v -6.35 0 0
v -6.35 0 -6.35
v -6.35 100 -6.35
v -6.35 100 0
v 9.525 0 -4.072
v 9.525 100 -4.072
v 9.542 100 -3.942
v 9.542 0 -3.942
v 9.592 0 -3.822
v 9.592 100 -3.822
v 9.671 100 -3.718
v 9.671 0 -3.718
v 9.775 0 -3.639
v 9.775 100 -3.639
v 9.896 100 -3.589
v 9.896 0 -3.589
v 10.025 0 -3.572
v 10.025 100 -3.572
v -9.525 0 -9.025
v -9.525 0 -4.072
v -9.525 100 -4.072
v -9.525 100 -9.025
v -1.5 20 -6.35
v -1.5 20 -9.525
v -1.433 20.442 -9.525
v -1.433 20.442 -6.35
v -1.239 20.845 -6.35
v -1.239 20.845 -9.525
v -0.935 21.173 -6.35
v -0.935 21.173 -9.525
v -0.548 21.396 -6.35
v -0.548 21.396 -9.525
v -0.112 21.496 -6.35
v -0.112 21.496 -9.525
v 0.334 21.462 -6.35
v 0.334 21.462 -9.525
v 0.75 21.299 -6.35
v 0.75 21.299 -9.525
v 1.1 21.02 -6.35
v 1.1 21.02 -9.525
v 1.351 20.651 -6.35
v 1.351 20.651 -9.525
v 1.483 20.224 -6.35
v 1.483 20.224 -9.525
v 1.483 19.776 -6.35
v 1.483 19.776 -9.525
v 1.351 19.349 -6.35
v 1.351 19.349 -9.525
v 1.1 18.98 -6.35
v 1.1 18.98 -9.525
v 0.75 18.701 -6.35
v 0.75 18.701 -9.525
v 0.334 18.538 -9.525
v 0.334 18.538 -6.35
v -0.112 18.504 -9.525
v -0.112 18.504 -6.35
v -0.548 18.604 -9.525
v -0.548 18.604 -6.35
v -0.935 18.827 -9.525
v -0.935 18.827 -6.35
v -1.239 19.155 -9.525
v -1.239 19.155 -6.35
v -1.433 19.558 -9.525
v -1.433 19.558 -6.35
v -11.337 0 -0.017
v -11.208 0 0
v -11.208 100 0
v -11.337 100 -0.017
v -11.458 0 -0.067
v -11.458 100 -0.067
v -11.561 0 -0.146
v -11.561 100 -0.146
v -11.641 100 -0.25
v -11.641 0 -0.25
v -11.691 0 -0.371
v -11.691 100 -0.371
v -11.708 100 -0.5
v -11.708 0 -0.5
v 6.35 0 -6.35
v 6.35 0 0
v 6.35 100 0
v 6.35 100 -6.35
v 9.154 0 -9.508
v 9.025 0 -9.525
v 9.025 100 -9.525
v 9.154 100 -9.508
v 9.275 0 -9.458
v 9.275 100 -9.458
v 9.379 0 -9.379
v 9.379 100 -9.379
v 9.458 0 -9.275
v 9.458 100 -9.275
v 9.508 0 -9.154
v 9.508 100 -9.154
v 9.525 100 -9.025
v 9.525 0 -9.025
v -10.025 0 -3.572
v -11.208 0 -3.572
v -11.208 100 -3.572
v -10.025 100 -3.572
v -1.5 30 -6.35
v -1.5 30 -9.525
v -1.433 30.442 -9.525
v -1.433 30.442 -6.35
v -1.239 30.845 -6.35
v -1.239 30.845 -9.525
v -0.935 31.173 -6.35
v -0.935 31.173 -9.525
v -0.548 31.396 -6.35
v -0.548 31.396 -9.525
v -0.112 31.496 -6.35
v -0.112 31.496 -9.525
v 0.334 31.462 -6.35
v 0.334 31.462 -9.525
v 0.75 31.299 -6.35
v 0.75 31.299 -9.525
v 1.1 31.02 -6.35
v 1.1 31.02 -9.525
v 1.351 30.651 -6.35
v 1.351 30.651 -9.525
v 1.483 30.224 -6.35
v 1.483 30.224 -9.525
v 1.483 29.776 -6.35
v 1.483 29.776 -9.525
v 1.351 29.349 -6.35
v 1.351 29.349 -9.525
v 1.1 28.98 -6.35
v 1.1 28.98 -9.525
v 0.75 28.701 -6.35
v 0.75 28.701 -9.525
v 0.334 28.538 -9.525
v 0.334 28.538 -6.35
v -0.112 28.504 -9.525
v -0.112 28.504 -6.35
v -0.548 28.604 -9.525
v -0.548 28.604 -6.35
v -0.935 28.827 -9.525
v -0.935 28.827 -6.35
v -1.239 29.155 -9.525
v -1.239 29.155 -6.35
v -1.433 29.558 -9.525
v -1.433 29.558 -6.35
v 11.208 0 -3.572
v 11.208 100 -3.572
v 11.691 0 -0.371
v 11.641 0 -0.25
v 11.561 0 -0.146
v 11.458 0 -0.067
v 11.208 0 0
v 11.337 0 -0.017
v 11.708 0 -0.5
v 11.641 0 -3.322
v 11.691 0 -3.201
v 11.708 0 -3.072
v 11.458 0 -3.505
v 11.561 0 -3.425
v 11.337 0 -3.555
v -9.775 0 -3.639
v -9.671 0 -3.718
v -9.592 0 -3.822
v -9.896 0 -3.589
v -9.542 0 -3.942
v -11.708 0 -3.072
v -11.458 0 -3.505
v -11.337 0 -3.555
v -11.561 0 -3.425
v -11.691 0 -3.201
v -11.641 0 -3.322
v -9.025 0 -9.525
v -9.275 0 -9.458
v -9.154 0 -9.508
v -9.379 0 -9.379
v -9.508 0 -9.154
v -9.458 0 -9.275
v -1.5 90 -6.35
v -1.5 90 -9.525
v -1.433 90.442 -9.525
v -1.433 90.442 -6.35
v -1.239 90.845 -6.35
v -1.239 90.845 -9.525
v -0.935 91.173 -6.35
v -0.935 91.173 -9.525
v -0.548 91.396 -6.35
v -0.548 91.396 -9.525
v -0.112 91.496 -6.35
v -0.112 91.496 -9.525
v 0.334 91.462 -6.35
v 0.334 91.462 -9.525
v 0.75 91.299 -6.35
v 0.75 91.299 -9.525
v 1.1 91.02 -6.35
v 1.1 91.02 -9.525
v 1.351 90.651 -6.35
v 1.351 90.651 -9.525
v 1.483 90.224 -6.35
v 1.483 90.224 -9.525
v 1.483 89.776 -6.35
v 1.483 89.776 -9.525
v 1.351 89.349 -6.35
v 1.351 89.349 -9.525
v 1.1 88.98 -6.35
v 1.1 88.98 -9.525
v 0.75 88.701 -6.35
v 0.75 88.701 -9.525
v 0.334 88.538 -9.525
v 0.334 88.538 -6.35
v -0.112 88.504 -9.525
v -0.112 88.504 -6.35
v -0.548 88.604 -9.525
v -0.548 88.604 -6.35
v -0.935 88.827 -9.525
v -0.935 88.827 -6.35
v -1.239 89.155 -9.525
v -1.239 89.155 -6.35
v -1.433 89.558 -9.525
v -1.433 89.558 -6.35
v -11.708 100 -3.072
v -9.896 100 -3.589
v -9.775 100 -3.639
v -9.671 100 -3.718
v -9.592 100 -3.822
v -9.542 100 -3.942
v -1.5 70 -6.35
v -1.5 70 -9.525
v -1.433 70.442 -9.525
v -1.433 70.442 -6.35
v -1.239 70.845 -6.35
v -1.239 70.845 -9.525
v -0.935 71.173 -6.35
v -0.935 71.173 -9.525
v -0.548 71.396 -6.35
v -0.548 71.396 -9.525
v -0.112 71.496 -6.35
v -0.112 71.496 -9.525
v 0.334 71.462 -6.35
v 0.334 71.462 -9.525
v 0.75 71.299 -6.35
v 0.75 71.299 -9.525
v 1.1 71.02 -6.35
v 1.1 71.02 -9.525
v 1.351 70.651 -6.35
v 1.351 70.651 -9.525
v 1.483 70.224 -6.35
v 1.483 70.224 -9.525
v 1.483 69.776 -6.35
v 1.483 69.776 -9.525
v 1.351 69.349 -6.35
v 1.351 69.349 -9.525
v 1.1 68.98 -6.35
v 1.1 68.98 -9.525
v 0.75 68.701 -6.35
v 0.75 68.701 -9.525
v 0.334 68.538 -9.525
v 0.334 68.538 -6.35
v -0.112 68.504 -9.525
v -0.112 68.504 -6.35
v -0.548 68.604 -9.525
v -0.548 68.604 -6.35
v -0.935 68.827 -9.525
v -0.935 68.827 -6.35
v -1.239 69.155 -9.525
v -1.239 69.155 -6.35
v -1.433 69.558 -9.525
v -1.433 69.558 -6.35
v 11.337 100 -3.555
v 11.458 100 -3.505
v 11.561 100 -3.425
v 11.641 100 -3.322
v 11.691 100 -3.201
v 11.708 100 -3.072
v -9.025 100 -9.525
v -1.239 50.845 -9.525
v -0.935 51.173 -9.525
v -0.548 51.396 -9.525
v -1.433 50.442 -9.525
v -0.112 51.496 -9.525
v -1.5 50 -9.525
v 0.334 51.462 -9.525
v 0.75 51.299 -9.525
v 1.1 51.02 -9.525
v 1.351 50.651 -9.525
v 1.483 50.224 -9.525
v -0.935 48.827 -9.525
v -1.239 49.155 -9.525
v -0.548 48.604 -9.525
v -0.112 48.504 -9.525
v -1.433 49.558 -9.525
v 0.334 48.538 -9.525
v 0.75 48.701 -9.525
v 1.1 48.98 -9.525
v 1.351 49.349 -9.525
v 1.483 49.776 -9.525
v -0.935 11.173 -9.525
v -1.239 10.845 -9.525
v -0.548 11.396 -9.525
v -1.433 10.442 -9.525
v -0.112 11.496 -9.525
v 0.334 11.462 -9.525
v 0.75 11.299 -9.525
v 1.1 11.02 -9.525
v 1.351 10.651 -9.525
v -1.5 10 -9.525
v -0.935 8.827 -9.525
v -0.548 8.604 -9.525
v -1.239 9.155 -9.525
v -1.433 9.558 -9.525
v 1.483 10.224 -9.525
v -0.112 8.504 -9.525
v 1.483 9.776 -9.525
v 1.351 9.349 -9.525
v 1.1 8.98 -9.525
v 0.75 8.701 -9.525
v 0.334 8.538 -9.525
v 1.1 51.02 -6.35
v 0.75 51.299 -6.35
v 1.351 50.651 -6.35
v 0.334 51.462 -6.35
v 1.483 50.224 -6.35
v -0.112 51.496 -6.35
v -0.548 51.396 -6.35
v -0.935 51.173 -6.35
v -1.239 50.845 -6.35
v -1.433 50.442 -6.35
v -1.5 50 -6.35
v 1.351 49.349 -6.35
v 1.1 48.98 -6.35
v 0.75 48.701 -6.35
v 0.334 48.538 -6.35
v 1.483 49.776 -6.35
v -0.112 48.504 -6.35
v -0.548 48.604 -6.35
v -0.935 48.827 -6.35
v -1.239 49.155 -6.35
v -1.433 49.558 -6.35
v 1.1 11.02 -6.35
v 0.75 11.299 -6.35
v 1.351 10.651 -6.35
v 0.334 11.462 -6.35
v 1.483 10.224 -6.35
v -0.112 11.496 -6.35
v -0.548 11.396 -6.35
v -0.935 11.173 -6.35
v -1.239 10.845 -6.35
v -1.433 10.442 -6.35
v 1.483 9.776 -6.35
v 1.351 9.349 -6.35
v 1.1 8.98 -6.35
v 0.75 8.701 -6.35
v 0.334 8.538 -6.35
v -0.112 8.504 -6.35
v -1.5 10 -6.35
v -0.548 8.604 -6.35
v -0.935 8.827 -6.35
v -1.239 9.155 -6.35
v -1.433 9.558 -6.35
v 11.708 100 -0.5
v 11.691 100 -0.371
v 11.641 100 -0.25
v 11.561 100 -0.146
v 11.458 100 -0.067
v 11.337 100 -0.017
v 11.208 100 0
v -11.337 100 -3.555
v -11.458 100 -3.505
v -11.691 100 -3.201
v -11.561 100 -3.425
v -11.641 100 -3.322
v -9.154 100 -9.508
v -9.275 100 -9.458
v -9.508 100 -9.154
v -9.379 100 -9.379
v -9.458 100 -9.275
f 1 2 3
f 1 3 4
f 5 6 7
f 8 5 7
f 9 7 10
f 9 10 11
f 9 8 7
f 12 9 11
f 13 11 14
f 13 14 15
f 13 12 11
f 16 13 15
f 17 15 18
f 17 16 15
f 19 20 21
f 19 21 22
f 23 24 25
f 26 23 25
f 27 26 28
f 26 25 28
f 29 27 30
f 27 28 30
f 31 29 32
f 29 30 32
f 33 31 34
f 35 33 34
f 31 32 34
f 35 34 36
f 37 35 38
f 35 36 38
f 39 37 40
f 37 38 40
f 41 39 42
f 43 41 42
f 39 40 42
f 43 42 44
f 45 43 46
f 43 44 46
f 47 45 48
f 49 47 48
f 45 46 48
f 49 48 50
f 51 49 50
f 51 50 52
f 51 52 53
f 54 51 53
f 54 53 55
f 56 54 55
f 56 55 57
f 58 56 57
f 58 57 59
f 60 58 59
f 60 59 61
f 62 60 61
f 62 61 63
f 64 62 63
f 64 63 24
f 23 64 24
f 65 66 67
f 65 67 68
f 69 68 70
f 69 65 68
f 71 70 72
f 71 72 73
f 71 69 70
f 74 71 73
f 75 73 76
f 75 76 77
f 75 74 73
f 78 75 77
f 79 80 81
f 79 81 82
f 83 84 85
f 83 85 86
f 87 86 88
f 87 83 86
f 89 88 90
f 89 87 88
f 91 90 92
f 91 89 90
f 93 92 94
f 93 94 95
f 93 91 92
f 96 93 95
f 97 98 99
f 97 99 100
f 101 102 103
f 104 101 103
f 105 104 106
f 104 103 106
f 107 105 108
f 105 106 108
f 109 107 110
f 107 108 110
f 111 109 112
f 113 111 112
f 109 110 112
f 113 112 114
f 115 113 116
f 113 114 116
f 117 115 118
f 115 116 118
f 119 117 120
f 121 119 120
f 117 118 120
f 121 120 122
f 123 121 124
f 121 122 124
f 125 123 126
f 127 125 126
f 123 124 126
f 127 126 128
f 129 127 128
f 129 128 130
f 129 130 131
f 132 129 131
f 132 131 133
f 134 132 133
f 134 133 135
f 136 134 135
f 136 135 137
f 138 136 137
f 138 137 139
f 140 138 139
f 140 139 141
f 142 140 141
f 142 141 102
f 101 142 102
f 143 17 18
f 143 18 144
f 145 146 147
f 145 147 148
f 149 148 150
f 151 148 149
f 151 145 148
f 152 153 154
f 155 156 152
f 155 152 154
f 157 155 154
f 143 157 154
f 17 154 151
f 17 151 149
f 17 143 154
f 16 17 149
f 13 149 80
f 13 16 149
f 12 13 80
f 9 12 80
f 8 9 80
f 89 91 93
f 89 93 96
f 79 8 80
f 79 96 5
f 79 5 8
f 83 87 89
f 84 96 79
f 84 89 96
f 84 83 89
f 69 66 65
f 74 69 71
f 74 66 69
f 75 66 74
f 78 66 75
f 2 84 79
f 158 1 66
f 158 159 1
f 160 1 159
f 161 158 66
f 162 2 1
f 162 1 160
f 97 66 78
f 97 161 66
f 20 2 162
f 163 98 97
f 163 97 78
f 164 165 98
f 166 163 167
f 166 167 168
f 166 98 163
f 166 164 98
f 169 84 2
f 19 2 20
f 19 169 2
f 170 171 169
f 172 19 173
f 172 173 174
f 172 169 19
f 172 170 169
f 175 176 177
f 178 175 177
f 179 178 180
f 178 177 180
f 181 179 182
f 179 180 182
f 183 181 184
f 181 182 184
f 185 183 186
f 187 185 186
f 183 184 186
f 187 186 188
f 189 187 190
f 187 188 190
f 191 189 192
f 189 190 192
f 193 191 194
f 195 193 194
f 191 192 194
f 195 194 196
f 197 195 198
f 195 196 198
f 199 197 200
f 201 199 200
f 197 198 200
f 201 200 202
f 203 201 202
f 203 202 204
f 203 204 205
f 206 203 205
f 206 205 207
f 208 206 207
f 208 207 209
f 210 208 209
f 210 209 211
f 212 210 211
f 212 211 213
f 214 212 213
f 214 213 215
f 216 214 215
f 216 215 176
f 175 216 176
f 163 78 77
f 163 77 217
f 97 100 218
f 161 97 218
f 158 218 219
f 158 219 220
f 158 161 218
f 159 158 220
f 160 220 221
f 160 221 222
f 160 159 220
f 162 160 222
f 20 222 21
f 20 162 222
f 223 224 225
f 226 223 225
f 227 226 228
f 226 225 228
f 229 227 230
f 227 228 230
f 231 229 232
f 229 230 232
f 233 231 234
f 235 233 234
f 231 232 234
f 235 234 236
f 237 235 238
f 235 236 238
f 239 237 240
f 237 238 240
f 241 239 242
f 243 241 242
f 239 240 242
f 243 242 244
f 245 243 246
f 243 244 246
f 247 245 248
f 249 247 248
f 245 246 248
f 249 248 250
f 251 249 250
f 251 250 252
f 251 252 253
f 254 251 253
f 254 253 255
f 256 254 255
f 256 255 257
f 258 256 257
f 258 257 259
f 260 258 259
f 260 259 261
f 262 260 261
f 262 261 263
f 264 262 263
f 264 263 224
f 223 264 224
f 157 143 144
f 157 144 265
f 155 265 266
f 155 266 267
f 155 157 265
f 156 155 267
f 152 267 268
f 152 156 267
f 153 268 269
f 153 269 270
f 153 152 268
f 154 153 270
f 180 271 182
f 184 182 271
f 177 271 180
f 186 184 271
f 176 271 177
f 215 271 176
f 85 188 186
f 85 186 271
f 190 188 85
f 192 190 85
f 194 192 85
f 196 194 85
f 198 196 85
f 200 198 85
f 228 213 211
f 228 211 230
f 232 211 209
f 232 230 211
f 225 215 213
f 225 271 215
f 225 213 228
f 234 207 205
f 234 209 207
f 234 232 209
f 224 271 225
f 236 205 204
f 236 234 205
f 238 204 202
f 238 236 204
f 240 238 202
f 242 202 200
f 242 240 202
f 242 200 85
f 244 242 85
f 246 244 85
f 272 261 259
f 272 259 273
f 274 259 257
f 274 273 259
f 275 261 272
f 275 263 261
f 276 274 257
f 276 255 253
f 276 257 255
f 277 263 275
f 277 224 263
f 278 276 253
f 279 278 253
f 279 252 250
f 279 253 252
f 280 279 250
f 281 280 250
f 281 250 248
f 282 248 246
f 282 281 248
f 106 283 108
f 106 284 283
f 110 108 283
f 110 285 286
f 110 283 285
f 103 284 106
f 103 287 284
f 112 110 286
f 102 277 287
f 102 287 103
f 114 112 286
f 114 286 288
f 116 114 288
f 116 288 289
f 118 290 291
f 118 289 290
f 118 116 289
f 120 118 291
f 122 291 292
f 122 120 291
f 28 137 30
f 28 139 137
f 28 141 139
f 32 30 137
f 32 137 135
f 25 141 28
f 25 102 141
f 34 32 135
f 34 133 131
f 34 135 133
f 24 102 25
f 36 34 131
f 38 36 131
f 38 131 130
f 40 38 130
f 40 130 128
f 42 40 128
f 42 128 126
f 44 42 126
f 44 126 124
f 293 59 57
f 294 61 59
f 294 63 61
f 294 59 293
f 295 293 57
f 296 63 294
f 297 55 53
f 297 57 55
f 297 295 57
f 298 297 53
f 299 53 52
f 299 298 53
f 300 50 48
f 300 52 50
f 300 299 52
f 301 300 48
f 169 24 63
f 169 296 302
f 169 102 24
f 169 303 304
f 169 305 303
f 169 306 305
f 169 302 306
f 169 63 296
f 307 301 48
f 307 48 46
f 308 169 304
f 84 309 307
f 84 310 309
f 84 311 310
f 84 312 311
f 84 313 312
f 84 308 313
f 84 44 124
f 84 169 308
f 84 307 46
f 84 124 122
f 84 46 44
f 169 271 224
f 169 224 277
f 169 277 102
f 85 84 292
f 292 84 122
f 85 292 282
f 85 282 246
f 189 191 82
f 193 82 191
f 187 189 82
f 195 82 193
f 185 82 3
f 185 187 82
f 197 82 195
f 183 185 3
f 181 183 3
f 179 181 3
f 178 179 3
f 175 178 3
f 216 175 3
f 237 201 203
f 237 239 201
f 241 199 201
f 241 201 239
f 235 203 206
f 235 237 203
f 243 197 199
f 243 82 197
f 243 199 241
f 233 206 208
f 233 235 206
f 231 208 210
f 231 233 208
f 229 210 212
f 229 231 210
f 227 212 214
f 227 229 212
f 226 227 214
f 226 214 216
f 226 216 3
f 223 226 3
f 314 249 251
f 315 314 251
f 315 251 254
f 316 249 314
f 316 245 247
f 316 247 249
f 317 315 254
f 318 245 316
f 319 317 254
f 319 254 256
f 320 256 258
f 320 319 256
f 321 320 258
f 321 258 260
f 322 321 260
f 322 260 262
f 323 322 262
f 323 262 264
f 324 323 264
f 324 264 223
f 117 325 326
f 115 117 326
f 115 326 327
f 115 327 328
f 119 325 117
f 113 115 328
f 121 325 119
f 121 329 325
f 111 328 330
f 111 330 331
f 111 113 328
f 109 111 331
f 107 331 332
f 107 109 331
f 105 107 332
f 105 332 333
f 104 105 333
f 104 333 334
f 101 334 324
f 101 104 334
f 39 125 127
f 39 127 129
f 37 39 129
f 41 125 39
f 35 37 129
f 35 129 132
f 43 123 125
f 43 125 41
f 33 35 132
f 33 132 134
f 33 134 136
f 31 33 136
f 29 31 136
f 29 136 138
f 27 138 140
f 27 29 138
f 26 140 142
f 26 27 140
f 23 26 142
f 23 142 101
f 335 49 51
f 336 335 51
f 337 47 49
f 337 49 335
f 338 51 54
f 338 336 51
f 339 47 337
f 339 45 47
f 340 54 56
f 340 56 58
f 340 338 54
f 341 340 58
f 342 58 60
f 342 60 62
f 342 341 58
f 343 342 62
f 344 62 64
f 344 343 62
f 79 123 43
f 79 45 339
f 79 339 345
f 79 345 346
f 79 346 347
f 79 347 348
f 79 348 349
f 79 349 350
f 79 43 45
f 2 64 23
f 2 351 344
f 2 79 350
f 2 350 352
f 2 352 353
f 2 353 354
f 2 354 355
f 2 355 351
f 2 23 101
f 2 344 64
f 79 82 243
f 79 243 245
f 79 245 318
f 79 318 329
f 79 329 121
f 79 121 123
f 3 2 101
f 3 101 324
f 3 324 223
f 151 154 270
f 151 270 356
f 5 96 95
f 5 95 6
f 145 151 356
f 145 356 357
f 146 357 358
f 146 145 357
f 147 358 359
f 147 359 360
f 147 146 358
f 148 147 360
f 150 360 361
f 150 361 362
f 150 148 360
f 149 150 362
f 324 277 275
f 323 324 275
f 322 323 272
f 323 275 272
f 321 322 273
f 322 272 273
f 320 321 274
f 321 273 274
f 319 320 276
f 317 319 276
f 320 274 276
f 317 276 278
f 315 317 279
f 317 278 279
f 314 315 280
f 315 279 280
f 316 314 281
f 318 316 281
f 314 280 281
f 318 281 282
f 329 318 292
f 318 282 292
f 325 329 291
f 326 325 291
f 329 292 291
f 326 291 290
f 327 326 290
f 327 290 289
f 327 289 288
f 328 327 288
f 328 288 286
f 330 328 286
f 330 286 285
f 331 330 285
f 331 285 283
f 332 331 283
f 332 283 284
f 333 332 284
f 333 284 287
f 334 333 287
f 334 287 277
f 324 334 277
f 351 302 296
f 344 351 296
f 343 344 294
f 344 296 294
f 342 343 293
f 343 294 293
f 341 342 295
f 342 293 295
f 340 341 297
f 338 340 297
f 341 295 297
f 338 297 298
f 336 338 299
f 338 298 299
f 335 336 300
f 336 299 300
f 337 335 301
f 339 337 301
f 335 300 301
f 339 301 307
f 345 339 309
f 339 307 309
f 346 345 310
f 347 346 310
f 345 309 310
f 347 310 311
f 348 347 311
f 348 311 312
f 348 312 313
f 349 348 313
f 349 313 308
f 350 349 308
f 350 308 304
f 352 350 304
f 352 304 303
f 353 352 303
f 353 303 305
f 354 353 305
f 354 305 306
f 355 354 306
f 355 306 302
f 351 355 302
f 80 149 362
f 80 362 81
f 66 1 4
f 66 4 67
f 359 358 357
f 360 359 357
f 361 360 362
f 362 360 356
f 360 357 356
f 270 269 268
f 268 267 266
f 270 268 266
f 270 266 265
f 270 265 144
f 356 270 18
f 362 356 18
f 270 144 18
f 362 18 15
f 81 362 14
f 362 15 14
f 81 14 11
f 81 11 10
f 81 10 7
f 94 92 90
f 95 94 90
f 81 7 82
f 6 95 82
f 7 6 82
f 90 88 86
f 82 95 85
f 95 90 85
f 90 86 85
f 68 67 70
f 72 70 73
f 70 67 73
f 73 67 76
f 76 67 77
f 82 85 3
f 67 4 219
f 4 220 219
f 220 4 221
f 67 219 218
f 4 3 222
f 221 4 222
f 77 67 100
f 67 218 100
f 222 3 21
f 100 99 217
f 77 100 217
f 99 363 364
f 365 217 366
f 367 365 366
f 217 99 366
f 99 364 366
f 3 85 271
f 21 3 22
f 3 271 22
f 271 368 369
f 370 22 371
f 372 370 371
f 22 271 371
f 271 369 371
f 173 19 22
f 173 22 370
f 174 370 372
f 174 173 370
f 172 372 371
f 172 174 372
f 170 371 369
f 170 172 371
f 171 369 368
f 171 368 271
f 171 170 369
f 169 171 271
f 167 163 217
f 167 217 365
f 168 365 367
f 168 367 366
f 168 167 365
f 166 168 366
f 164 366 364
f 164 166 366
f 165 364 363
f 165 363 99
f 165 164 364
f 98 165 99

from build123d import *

# Parameters (mm, degrees)
BOSS_EXTRUDE1_DEPTH = 100
CUT_EXTRUDE1_REACH  = 103.133
SKETCH2_R           = 1.5


with BuildPart() as part:
    # Sketch1 → Boss-Extrude1 (new body)
    with BuildSketch(Plane(origin=(0, 0, 0), x_dir=(1, 0, 0), z_dir=(0, 1, 0))):
        with BuildLine():
            Line((11.2078125, 0), (6.35, 0))
            Line((6.35, 0), (6.35, 6.35))
            Line((6.35, 6.35), (-6.35, 6.35))
            Line((-6.35, 6.35), (-6.35, 0))
            Line((-6.35, 0), (-11.2078125, 0))
            ThreePointArc((-11.2078125, 0), (-11.561365891, 0.146446609), (-11.7078125, 0.5))
            Line((-11.7078125, 0.5), (-11.7078125, 3.071875))
            ThreePointArc((-11.7078125, 3.071875), (-11.561365891, 3.425428391), (-11.2078125, 3.571875))
            Line((-11.2078125, 3.571875), (-10.025, 3.571875))
            ThreePointArc((-10.025, 3.571875), (-9.671446609, 3.718321609), (-9.525, 4.071875))
            Line((-9.525, 4.071875), (-9.525, 9.025))
            ThreePointArc((-9.525, 9.025), (-9.378553391, 9.378553391), (-9.025, 9.525))
            Line((-9.025, 9.525), (9.025, 9.525))
            ThreePointArc((9.025, 9.525), (9.378553391, 9.378553391), (9.525, 9.025))
            Line((9.525, 9.025), (9.525, 4.071875))
            ThreePointArc((9.525, 4.071875), (9.671446609, 3.718321609), (10.025, 3.571875))
            Line((10.025, 3.571875), (11.2078125, 3.571875))
            ThreePointArc((11.2078125, 3.571875), (11.561365891, 3.425428391), (11.7078125, 3.071875))
            Line((11.7078125, 3.071875), (11.7078125, 0.5))
            ThreePointArc((11.7078125, 0.5), (11.561365891, 0.146446609), (11.2078125, 0))
        make_face()
    extrude(amount=BOSS_EXTRUDE1_DEPTH)

    # Sketch2 → Cut-Extrude1 (cut, up to next)
    with BuildSketch(Plane(origin=(0, 0, -9.525), x_dir=(-1, 0, 0), z_dir=(0, 0, -1)), mode=Mode.PRIVATE) as cut_extrude1_sk1:
        with Locations((0, 10)):
            Circle(SKETCH2_R)
    cut_extrude1_tool1 = extrude(cut_extrude1_sk1.sketch, amount=-CUT_EXTRUDE1_REACH, mode=Mode.PRIVATE) & part.part
    # Sketch2 → Cut-Extrude1 (cut, up to next)
    with BuildSketch(Plane(origin=(0, 0, -9.525), x_dir=(-1, 0, 0), z_dir=(0, 0, -1)), mode=Mode.PRIVATE) as cut_extrude1_sk2:
        with Locations((0, 20)):
            Circle(SKETCH2_R)
    cut_extrude1_tool2 = extrude(cut_extrude1_sk2.sketch, amount=-CUT_EXTRUDE1_REACH, mode=Mode.PRIVATE) & part.part
    # Sketch2 → Cut-Extrude1 (cut, up to next)
    with BuildSketch(Plane(origin=(0, 0, -9.525), x_dir=(-1, 0, 0), z_dir=(0, 0, -1)), mode=Mode.PRIVATE) as cut_extrude1_sk3:
        with Locations((0, 30)):
            Circle(SKETCH2_R)
    cut_extrude1_tool3 = extrude(cut_extrude1_sk3.sketch, amount=-CUT_EXTRUDE1_REACH, mode=Mode.PRIVATE) & part.part
    # Sketch2 → Cut-Extrude1 (cut, up to next)
    with BuildSketch(Plane(origin=(0, 0, -9.525), x_dir=(-1, 0, 0), z_dir=(0, 0, -1)), mode=Mode.PRIVATE) as cut_extrude1_sk4:
        with Locations((0, 50)):
            Circle(SKETCH2_R)
    cut_extrude1_tool4 = extrude(cut_extrude1_sk4.sketch, amount=-CUT_EXTRUDE1_REACH, mode=Mode.PRIVATE) & part.part
    # Sketch2 → Cut-Extrude1 (cut, up to next)
    with BuildSketch(Plane(origin=(0, 0, -9.525), x_dir=(-1, 0, 0), z_dir=(0, 0, -1)), mode=Mode.PRIVATE) as cut_extrude1_sk5:
        with Locations((0, 70)):
            Circle(SKETCH2_R)
    cut_extrude1_tool5 = extrude(cut_extrude1_sk5.sketch, amount=-CUT_EXTRUDE1_REACH, mode=Mode.PRIVATE) & part.part
    # Sketch2 → Cut-Extrude1 (cut, up to next)
    with BuildSketch(Plane(origin=(0, 0, -9.525), x_dir=(-1, 0, 0), z_dir=(0, 0, -1)), mode=Mode.PRIVATE) as cut_extrude1_sk6:
        with Locations((0, 90)):
            Circle(SKETCH2_R)
    cut_extrude1_tool6 = extrude(cut_extrude1_sk6.sketch, amount=-CUT_EXTRUDE1_REACH, mode=Mode.PRIVATE) & part.part
    add(cut_extrude1_tool1.solids().sort_by_distance((0, 10, -9.525))[0], mode=Mode.SUBTRACT)
    add(cut_extrude1_tool2.solids().sort_by_distance((0, 20, -9.525))[0], mode=Mode.SUBTRACT)
    add(cut_extrude1_tool3.solids().sort_by_distance((0, 30, -9.525))[0], mode=Mode.SUBTRACT)
    add(cut_extrude1_tool4.solids().sort_by_distance((0, 50, -9.525))[0], mode=Mode.SUBTRACT)
    add(cut_extrude1_tool5.solids().sort_by_distance((0, 70, -9.525))[0], mode=Mode.SUBTRACT)
    add(cut_extrude1_tool6.solids().sort_by_distance((0, 90, -9.525))[0], mode=Mode.SUBTRACT)


solid = part.part
